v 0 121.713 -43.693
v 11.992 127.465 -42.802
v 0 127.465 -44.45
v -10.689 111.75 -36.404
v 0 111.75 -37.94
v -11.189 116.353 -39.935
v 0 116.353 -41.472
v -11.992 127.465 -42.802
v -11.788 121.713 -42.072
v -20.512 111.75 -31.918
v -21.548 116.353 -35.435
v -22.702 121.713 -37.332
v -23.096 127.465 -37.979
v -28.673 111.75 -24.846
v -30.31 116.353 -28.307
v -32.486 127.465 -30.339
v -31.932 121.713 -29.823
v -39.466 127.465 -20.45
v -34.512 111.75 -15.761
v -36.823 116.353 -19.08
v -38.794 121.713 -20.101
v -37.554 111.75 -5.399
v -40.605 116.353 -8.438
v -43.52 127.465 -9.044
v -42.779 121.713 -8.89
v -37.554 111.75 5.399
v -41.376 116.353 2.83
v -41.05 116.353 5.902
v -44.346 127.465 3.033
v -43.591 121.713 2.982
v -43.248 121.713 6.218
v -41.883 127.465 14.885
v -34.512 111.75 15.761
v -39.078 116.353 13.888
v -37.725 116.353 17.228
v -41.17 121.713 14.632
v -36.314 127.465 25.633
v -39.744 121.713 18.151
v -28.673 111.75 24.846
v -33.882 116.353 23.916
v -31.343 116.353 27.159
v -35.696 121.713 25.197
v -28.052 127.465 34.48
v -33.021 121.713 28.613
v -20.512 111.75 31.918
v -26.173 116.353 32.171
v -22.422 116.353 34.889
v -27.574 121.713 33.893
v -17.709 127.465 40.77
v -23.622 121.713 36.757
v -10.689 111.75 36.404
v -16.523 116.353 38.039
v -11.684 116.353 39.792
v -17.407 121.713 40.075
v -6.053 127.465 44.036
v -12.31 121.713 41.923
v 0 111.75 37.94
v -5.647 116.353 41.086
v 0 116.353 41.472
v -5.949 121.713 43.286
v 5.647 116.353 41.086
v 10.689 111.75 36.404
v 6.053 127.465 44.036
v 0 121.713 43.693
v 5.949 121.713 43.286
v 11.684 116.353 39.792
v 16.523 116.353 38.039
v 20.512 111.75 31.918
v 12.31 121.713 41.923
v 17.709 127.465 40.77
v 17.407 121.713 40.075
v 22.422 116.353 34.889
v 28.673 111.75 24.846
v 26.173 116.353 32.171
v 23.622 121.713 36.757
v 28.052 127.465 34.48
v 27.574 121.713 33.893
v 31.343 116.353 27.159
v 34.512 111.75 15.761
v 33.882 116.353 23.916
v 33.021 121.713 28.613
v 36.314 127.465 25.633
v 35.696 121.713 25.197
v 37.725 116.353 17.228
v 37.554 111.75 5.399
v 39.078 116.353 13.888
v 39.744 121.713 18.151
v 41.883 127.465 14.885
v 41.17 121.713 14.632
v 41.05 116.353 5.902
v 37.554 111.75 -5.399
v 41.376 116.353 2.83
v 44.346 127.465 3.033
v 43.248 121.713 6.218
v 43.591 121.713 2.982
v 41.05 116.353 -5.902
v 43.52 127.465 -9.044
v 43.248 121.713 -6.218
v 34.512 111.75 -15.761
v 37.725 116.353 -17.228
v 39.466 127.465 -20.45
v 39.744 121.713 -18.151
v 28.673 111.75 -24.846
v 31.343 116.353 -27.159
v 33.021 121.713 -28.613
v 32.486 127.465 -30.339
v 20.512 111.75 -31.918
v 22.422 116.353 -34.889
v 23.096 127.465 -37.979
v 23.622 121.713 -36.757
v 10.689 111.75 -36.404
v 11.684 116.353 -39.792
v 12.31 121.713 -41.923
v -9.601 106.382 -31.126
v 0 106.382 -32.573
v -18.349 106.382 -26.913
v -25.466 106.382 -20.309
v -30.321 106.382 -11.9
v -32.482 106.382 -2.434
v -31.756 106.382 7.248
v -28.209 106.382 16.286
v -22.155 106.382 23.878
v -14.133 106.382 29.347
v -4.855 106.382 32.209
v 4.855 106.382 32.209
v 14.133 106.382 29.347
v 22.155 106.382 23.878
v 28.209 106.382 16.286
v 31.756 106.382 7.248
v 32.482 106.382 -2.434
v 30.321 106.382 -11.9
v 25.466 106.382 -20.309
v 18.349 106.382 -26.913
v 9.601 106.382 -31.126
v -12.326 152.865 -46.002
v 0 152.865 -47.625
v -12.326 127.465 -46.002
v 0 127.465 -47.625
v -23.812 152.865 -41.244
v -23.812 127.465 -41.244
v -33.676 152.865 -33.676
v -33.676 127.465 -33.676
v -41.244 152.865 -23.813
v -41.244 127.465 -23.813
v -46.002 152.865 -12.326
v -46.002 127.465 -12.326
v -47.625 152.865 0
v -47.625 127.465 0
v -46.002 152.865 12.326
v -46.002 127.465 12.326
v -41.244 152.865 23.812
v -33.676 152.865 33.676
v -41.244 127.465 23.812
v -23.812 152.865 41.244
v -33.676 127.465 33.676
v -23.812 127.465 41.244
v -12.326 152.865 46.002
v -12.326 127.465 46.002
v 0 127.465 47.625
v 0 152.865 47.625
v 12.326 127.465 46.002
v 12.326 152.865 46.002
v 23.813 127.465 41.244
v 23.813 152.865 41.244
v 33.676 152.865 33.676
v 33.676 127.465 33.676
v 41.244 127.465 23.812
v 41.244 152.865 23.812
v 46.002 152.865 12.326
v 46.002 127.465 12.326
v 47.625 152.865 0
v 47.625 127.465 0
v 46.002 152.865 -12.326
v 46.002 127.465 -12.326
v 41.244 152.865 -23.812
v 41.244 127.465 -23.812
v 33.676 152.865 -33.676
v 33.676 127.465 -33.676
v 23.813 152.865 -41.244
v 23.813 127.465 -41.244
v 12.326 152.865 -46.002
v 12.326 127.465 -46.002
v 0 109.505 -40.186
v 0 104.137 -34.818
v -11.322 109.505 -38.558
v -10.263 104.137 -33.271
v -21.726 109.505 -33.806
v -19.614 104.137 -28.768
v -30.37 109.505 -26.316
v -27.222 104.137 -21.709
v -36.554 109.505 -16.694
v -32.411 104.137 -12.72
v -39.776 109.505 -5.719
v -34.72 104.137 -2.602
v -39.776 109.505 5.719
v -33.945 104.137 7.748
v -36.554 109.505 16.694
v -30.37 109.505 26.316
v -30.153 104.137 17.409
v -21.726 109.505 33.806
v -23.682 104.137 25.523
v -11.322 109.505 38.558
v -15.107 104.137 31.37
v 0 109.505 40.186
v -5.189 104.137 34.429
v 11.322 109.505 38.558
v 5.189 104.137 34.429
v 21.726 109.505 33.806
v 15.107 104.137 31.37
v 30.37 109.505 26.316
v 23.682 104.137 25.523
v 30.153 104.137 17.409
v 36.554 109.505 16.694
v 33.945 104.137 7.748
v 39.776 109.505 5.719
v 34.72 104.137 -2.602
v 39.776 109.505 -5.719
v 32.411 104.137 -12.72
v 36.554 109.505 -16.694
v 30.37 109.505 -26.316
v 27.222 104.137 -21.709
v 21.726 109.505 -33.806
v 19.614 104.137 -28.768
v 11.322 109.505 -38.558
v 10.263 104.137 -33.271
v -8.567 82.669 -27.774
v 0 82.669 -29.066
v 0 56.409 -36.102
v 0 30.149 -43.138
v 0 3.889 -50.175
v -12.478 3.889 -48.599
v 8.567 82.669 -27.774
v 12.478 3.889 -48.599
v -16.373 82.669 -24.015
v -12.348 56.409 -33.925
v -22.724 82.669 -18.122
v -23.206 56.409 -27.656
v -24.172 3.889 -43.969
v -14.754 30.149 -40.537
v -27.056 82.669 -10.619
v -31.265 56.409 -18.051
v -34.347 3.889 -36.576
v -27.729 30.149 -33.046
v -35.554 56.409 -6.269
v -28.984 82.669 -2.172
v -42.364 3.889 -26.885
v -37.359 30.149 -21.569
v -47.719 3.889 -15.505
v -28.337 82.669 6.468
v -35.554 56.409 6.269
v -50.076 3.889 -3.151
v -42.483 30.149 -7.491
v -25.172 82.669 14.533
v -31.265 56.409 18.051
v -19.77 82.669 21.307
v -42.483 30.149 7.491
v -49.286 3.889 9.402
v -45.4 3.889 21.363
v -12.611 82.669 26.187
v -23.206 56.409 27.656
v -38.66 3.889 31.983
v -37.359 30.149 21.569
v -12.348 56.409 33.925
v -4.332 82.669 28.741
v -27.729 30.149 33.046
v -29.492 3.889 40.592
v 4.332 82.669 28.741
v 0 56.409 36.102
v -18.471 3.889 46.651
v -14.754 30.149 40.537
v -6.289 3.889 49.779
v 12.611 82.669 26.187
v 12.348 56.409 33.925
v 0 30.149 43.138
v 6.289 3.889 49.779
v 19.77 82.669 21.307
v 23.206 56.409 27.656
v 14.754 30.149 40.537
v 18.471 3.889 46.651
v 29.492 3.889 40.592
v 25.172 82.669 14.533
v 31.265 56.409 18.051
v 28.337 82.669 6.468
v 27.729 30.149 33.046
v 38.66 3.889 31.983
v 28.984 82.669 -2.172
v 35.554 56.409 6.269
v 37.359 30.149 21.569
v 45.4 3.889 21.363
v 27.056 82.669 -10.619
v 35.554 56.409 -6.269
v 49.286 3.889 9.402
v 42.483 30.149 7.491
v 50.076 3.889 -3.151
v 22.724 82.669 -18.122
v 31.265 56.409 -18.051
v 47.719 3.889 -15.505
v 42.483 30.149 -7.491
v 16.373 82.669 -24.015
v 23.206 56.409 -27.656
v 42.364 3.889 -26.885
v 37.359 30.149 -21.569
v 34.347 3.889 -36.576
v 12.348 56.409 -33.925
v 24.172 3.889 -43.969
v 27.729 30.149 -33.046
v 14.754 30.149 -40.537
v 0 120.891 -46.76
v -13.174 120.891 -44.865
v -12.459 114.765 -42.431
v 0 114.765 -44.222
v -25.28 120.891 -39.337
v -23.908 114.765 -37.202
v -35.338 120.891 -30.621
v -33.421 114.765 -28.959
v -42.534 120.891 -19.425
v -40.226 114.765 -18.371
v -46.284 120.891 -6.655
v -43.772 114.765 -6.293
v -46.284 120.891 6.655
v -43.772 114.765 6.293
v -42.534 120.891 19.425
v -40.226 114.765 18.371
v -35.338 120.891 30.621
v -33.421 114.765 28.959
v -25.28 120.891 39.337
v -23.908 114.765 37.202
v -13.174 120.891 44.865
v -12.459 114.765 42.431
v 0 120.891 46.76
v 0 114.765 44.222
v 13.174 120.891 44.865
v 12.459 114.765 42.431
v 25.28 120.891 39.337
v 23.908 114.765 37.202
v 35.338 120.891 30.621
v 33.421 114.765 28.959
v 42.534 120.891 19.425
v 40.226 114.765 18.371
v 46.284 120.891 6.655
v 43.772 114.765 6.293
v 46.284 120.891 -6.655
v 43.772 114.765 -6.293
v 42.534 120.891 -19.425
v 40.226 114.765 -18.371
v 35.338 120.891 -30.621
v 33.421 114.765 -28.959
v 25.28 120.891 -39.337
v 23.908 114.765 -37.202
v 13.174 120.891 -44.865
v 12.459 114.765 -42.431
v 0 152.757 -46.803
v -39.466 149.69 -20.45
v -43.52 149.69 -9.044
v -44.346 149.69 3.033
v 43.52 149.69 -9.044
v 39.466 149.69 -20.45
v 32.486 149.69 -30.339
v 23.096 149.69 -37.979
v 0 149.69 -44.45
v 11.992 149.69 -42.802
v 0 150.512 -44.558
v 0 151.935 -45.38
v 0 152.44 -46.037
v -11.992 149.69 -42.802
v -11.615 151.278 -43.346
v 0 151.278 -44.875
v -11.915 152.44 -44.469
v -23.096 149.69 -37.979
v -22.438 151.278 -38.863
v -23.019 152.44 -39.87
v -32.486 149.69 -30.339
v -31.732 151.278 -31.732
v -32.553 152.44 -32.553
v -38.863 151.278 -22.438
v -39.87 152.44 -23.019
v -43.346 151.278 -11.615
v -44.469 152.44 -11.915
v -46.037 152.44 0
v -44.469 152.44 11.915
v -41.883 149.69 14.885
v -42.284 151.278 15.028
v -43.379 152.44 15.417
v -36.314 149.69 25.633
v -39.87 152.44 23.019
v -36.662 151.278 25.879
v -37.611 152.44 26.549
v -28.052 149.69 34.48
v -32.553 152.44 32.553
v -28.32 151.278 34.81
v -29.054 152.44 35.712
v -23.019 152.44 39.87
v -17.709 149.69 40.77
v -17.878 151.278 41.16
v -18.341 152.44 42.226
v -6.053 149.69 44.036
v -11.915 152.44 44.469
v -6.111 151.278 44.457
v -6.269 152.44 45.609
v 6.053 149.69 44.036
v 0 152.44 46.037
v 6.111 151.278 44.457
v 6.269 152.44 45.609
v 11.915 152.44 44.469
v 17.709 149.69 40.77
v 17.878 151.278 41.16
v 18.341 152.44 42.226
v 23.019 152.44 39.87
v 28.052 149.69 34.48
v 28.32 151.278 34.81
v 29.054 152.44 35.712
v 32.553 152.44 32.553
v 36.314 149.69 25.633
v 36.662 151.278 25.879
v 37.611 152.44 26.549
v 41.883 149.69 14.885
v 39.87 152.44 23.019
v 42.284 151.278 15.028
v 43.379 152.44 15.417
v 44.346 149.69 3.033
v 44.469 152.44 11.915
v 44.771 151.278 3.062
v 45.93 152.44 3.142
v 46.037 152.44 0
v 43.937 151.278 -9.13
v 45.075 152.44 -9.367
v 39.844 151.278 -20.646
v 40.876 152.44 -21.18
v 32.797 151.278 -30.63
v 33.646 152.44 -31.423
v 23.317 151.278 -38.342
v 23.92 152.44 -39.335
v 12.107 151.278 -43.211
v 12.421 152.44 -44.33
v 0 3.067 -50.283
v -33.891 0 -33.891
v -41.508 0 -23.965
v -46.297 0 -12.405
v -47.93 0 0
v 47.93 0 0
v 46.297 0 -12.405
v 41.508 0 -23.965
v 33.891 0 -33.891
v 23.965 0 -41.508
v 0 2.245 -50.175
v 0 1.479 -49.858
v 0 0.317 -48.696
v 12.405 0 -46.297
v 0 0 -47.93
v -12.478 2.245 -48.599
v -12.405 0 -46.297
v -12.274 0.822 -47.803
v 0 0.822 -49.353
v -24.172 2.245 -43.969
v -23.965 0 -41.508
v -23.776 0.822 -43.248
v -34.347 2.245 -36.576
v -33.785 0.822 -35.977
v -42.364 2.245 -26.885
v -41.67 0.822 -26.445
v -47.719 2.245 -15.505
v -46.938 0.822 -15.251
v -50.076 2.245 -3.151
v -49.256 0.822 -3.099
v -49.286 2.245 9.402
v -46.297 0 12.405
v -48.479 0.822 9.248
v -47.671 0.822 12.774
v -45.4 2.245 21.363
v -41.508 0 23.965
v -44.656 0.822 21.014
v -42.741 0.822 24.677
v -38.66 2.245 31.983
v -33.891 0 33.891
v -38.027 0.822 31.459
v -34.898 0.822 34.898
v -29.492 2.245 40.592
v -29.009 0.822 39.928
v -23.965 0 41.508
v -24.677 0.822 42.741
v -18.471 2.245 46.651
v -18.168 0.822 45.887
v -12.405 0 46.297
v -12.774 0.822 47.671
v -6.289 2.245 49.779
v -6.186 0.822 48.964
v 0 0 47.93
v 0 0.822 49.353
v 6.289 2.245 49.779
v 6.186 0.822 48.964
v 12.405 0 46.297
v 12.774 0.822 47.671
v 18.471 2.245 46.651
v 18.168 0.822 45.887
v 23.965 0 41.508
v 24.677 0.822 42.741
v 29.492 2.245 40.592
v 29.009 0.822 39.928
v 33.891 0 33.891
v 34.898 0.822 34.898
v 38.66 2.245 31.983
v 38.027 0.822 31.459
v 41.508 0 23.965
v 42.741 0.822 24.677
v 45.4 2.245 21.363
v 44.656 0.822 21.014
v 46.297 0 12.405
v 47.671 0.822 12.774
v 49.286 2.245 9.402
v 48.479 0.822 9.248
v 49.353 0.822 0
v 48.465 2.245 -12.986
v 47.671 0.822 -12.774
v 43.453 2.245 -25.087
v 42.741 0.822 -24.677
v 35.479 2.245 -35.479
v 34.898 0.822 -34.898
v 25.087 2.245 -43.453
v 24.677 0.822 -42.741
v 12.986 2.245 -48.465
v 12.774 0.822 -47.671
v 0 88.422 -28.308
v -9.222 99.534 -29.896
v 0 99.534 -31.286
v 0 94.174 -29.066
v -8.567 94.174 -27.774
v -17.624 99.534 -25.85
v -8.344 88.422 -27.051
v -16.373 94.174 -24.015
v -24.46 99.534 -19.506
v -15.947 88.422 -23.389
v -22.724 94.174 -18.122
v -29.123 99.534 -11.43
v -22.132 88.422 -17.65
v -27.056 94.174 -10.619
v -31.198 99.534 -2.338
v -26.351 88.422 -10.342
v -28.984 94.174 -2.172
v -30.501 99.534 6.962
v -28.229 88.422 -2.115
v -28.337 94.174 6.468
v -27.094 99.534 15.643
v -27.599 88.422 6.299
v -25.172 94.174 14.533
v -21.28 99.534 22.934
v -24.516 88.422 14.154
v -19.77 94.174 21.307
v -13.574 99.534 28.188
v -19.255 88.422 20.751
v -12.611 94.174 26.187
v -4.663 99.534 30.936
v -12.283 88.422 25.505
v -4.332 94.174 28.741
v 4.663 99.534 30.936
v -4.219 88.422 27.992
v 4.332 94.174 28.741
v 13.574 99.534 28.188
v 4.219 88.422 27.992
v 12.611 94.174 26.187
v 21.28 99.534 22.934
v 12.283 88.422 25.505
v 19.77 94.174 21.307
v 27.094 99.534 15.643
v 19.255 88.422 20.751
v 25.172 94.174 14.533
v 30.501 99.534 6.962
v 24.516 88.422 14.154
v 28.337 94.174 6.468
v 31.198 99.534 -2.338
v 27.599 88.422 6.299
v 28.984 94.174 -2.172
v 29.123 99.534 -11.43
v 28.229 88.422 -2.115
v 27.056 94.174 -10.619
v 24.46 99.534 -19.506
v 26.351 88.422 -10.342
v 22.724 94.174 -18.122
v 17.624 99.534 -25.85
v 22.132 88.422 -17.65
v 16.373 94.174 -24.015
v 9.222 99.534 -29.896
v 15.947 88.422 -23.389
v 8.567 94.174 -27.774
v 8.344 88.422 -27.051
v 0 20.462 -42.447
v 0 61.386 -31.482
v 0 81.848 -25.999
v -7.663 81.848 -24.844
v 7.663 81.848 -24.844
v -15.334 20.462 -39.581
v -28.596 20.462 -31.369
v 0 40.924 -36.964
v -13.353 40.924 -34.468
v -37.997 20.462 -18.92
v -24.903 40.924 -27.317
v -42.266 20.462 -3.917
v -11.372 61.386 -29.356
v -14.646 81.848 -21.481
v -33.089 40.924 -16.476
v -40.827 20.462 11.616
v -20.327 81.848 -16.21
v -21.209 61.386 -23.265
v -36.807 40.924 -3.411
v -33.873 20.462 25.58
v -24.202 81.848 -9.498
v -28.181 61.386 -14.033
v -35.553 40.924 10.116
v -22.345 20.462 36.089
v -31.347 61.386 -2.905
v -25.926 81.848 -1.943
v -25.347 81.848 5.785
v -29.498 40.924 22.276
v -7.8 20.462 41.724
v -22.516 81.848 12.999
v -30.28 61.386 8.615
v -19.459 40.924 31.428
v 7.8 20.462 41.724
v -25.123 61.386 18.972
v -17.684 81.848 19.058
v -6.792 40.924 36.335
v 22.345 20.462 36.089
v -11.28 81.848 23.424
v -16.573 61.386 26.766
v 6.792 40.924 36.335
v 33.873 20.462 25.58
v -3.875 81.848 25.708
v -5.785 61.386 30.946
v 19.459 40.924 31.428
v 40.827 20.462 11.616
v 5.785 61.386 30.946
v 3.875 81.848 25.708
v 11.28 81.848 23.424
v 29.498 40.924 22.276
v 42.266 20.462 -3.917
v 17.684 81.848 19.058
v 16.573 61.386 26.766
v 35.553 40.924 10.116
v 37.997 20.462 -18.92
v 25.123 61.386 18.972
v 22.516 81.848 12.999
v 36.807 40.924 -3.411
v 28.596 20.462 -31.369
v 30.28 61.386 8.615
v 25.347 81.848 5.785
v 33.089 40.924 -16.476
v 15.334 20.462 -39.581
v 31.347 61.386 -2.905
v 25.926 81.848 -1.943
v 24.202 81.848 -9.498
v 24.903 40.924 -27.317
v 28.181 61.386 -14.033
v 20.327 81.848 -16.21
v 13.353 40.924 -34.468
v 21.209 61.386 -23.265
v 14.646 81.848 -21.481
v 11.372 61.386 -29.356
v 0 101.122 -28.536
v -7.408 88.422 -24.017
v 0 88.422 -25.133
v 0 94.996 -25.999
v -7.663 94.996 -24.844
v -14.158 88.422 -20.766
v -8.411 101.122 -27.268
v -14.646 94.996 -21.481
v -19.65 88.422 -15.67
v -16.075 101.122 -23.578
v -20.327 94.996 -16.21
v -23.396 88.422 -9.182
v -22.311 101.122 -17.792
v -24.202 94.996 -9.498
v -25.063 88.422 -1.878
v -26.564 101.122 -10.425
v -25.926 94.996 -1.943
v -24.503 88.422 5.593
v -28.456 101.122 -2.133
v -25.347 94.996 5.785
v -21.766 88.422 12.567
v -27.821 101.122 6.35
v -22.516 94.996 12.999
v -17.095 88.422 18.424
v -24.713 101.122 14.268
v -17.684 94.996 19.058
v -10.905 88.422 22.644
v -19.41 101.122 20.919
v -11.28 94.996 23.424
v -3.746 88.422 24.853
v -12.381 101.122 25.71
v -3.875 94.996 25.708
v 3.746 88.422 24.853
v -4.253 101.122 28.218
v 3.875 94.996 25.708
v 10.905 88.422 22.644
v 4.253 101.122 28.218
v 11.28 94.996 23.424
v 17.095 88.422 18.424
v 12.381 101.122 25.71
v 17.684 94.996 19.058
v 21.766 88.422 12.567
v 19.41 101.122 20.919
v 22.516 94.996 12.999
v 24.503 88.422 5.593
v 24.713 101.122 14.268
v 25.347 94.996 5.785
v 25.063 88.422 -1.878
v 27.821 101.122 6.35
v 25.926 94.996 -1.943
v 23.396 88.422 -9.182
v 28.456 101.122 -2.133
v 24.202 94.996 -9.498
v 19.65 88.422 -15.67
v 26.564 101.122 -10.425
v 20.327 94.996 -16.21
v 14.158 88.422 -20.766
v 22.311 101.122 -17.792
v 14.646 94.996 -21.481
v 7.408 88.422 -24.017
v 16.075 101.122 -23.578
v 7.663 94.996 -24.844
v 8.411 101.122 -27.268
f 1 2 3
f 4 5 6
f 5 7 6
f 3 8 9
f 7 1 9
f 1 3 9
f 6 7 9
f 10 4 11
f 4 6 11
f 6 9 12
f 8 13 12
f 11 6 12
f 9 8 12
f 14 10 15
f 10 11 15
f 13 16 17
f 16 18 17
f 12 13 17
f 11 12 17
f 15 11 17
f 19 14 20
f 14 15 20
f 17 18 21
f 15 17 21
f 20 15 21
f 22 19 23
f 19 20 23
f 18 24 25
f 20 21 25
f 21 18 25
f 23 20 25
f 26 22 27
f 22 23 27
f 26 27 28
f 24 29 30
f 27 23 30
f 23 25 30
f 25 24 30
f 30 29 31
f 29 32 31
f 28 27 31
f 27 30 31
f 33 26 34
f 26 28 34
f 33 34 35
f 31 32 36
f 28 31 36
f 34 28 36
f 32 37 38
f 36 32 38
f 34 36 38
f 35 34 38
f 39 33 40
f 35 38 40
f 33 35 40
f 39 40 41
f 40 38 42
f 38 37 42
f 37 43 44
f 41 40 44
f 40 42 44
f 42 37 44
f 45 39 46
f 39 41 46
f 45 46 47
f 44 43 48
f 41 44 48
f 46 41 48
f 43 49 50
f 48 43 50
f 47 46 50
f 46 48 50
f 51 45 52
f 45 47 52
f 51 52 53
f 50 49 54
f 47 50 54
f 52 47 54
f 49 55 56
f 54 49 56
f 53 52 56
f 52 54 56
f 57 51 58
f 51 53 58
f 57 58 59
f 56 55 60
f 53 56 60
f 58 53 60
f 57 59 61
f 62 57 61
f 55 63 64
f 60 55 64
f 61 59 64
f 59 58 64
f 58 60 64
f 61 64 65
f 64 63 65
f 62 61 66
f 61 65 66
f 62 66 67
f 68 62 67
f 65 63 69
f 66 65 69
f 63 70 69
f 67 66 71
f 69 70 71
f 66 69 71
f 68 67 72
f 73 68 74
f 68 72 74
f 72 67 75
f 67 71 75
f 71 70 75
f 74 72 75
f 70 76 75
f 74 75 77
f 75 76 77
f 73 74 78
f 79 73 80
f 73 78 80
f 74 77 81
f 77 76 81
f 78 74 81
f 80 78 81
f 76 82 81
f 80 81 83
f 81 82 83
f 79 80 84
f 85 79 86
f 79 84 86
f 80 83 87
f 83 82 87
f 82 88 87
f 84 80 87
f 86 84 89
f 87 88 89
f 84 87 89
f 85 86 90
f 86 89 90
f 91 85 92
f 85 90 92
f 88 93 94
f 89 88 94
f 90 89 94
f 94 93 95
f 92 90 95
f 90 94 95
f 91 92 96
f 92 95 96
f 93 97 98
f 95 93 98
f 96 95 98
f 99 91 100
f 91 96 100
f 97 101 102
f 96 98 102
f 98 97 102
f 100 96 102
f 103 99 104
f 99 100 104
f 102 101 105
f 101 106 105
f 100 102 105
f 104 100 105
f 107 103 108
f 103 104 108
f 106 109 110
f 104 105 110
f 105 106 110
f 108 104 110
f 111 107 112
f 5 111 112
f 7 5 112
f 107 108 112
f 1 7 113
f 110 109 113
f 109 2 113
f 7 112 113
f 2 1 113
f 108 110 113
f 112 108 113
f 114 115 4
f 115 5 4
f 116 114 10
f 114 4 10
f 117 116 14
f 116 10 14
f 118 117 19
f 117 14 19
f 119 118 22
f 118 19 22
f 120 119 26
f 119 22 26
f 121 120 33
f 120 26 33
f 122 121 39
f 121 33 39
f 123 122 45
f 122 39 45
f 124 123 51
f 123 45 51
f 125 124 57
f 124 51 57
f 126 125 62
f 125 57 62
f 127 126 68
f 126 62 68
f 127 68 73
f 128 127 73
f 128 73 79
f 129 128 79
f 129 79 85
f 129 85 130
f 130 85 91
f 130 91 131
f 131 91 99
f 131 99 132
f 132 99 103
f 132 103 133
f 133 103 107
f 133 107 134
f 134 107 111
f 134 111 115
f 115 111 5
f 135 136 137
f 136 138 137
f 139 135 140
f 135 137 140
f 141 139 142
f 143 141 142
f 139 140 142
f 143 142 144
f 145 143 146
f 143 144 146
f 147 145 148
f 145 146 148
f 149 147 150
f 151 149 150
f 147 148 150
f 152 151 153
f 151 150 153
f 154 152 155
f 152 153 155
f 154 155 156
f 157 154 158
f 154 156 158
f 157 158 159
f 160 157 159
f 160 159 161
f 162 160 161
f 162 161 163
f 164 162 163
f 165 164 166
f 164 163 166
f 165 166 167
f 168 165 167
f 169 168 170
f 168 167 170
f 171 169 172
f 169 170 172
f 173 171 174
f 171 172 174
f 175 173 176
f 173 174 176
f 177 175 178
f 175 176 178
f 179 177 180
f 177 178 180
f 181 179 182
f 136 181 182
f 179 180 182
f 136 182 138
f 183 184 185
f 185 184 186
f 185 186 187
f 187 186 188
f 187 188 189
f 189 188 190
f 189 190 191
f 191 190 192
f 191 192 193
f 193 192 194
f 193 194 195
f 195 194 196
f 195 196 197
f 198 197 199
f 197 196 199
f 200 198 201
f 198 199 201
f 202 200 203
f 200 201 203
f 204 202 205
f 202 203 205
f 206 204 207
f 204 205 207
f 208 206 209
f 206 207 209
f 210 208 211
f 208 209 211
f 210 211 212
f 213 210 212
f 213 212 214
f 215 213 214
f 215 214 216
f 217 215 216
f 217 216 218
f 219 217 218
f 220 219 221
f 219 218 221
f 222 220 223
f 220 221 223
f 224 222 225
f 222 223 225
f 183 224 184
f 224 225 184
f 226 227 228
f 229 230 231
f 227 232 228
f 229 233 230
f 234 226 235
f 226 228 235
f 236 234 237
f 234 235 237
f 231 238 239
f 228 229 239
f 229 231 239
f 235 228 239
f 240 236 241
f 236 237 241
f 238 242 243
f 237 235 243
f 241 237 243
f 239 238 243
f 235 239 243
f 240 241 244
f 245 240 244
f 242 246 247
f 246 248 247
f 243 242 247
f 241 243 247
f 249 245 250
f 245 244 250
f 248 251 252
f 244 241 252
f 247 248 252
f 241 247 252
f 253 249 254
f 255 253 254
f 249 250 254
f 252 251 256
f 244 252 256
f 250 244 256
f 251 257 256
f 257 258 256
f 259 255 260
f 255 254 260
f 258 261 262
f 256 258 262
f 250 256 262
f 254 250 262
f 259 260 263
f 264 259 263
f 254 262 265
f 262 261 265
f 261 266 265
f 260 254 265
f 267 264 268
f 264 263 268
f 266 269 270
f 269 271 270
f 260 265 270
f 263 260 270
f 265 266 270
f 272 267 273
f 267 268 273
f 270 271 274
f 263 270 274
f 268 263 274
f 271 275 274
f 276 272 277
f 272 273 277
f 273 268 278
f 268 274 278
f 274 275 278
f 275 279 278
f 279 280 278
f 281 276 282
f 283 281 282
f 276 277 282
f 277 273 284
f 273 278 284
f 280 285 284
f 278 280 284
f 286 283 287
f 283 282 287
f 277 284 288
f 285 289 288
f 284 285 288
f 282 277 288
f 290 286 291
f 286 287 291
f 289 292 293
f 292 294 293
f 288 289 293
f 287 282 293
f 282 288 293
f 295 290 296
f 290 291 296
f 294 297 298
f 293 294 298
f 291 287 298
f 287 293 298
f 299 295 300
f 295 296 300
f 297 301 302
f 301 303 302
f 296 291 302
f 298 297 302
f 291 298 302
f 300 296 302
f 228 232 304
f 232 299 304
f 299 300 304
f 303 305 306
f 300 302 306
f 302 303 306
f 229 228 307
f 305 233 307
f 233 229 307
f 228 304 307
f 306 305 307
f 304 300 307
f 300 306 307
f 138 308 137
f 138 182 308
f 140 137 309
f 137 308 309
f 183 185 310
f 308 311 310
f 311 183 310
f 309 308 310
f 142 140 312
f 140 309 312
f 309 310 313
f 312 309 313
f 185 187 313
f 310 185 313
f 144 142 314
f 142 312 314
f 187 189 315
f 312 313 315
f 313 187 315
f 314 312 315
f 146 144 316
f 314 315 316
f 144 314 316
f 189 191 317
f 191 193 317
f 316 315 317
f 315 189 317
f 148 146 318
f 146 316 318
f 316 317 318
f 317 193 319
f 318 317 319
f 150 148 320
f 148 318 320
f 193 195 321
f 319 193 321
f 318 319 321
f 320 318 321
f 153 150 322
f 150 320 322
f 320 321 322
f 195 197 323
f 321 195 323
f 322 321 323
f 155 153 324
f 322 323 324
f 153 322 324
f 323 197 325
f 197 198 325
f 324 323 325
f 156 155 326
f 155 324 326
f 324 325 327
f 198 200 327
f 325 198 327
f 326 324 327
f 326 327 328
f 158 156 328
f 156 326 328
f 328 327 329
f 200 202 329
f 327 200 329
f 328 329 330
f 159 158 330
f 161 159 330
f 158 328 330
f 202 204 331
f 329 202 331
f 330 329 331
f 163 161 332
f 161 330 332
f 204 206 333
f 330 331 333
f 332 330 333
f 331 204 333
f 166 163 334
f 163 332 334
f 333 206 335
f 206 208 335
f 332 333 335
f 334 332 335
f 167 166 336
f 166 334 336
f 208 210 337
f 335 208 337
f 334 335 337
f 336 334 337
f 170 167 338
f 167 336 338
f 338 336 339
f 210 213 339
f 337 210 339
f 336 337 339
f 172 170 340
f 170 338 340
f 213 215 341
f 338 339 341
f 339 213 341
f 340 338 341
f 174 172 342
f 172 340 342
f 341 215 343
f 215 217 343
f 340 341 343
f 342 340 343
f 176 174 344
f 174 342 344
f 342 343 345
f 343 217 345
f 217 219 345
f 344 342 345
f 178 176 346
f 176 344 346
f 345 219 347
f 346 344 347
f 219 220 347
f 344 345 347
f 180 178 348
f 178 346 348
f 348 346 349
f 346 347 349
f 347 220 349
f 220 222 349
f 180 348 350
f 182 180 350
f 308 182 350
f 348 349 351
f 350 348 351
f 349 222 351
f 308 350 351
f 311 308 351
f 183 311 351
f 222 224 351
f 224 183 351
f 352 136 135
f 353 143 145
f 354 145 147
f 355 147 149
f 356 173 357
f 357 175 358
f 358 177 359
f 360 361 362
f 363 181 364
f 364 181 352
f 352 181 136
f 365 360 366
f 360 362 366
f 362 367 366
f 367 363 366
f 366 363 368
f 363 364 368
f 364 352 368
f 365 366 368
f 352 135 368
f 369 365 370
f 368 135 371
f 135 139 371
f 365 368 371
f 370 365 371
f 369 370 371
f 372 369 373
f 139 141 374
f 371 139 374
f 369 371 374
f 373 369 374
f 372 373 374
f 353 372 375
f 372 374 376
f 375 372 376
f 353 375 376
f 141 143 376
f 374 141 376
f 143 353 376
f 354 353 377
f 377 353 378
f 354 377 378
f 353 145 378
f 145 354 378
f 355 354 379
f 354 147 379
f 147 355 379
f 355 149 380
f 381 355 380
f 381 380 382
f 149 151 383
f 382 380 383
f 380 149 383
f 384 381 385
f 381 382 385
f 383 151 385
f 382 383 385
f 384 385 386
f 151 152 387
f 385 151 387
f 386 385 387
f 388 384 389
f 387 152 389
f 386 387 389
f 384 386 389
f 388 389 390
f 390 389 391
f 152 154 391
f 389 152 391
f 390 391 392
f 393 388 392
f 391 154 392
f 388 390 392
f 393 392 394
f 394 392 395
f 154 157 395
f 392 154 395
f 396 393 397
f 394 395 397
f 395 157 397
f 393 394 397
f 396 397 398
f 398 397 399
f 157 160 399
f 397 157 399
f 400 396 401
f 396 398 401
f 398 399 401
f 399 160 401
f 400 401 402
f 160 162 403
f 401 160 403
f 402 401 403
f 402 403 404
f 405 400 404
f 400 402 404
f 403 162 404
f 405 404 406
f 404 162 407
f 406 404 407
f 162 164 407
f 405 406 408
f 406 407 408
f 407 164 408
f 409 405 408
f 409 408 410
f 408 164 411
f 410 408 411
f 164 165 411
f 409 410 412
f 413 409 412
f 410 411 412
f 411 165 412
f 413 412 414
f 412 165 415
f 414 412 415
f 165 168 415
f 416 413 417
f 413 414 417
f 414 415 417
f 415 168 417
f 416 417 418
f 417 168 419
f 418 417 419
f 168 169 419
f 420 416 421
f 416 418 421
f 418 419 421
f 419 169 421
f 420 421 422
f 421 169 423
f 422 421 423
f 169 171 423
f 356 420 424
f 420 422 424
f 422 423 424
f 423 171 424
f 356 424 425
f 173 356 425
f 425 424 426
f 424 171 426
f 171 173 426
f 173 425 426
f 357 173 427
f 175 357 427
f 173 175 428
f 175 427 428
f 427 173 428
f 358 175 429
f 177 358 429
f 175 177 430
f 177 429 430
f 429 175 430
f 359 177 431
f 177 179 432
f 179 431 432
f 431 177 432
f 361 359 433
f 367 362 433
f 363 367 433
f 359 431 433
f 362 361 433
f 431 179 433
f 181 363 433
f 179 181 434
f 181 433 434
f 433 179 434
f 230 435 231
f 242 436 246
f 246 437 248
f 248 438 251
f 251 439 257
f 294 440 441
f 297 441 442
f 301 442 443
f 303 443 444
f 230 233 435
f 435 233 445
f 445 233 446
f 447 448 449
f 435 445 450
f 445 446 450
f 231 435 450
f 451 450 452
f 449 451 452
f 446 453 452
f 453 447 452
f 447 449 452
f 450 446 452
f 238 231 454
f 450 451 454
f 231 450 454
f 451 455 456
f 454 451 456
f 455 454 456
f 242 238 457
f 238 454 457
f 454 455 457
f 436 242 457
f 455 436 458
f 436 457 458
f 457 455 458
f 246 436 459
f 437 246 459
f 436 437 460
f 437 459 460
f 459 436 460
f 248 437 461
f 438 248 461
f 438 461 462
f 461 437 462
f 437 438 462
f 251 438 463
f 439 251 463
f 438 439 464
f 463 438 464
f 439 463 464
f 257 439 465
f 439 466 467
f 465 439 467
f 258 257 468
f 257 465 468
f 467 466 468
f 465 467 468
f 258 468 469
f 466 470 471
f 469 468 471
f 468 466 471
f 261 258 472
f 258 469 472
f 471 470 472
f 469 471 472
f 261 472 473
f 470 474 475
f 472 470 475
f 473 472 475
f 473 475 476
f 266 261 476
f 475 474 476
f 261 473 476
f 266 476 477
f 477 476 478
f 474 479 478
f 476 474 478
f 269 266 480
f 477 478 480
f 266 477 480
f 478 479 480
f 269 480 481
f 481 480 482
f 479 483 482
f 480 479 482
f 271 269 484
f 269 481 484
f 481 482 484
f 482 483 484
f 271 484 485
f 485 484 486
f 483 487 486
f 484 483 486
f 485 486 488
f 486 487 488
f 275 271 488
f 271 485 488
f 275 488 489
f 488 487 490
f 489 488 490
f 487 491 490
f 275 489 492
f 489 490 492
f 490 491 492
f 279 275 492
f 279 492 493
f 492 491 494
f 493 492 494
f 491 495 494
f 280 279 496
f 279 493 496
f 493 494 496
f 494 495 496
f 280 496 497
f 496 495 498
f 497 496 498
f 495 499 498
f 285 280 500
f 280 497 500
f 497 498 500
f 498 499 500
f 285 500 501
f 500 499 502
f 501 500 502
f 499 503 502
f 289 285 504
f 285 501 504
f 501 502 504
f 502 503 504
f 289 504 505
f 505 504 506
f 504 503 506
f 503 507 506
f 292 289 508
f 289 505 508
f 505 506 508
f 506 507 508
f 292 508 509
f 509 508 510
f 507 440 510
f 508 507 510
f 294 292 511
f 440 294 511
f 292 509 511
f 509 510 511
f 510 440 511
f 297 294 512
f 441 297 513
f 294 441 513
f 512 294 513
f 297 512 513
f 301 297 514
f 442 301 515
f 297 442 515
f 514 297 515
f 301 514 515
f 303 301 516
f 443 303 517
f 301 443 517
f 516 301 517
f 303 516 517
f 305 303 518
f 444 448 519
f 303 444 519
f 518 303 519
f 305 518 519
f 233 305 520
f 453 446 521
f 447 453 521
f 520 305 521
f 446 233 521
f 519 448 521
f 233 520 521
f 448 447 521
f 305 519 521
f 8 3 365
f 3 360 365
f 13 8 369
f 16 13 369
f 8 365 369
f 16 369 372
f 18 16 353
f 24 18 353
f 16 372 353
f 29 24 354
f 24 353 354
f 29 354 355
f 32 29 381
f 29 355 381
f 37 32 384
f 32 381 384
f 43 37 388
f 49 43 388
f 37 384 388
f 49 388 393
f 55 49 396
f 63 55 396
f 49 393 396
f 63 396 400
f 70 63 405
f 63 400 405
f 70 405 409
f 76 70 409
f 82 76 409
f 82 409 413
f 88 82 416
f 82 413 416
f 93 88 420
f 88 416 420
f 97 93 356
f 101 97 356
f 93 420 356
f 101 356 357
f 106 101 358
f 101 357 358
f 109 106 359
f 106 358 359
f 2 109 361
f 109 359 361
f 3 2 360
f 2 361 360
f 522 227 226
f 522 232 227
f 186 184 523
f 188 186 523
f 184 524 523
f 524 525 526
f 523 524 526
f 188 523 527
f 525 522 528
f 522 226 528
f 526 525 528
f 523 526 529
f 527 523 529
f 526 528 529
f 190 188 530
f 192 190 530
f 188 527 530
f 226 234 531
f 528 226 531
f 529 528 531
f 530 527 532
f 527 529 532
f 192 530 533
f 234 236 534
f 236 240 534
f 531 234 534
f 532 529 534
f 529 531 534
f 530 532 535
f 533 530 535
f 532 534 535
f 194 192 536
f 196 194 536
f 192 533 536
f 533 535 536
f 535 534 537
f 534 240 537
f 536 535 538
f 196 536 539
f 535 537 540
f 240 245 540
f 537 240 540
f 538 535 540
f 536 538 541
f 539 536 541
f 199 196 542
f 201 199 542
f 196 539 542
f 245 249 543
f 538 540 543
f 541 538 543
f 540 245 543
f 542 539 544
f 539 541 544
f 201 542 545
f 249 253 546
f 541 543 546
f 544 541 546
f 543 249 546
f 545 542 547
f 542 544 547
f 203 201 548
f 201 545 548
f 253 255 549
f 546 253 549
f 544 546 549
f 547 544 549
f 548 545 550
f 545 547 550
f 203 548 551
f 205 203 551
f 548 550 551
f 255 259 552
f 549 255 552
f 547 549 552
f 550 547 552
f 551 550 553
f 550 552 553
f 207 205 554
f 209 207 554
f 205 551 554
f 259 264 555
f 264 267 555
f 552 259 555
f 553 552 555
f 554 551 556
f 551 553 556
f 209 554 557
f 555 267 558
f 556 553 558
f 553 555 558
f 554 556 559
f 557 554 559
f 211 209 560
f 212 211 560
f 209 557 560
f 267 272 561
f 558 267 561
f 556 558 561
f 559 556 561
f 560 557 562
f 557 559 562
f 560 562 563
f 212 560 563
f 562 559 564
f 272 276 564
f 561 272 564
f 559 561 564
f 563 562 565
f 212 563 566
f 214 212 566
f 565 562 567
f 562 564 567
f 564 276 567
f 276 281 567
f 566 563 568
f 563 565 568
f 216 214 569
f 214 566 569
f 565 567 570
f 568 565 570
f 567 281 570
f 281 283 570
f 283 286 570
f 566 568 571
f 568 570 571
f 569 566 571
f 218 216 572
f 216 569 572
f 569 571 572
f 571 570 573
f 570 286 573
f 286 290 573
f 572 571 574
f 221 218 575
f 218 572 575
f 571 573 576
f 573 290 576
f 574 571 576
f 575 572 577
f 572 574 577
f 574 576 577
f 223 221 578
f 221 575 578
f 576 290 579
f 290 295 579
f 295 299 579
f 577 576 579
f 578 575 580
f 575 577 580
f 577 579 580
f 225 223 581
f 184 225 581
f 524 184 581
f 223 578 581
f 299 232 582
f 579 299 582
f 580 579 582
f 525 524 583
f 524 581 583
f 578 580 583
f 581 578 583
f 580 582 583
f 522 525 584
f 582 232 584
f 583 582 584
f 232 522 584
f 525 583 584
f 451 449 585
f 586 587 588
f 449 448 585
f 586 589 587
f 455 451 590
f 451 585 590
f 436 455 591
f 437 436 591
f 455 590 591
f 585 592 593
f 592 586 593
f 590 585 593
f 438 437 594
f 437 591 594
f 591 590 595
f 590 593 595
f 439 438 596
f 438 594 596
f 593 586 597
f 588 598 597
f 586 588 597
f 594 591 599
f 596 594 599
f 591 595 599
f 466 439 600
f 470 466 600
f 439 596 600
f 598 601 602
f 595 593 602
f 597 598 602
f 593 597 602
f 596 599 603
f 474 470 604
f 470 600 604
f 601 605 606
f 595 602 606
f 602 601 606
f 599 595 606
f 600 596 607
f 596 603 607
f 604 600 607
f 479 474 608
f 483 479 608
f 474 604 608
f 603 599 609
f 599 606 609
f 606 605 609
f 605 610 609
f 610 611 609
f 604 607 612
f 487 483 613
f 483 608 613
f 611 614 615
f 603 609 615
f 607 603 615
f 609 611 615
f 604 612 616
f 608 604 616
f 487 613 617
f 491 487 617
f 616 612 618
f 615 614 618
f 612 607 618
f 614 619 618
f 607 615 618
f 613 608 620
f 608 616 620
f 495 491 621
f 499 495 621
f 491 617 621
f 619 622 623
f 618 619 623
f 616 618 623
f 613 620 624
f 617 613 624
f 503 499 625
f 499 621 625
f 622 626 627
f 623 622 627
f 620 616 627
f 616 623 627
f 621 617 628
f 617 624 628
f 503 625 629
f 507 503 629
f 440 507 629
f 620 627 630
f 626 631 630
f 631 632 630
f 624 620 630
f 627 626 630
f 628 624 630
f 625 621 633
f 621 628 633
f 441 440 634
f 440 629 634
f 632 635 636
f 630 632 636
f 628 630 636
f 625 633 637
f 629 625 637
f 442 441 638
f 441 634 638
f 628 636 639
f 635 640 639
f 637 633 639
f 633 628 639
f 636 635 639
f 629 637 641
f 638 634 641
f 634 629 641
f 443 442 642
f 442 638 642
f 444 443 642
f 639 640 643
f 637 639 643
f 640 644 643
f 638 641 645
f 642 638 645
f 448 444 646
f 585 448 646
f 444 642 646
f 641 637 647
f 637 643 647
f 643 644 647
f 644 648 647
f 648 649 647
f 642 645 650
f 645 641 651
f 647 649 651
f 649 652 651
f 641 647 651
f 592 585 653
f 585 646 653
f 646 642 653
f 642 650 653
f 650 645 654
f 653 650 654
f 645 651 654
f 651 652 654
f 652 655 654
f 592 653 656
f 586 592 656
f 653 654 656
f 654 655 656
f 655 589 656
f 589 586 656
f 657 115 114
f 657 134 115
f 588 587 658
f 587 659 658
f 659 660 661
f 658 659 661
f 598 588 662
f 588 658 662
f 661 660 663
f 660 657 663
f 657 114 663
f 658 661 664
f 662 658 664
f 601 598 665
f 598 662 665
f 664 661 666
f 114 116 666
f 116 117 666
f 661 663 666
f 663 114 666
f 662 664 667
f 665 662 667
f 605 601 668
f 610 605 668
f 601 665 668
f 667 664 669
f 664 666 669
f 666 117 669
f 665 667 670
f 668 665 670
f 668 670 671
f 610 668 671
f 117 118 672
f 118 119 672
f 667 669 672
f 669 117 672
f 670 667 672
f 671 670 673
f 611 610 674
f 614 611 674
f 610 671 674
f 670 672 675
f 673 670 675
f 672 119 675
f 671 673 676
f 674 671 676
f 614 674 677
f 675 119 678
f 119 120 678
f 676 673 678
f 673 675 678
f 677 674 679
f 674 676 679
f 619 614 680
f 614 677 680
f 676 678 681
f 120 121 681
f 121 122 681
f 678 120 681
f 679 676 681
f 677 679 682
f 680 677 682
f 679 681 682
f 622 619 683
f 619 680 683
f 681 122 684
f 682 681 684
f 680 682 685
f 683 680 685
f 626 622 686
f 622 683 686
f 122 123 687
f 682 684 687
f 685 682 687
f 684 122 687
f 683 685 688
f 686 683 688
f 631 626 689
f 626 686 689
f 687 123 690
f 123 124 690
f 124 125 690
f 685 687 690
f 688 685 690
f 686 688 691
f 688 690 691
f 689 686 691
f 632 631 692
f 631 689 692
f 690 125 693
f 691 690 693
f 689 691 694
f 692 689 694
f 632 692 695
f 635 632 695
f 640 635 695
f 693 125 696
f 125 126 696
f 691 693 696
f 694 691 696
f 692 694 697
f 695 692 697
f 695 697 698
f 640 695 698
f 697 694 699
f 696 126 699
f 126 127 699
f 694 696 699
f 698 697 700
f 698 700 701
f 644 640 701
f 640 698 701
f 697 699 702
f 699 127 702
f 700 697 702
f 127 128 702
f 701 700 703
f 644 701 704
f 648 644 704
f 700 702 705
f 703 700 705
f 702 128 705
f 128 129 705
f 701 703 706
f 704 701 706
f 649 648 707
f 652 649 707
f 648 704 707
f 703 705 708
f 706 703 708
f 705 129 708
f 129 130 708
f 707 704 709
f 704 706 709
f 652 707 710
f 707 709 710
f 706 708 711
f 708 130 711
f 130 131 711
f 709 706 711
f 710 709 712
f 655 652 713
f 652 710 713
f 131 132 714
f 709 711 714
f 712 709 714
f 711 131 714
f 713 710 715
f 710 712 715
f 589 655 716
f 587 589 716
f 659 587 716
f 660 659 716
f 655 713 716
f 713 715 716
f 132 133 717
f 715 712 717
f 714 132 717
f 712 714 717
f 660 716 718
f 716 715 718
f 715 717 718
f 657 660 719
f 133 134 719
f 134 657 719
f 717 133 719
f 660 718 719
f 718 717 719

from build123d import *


with BuildPart() as part:
    # Sketch1 → Revolve1 (revolve)
    with BuildSketch(Plane.XY, mode=Mode.PRIVATE) as revolve1_sk:
        with BuildLine():
            Line((47.9298, 0), (25.998784012, 81.847665928))
            ThreePointArc((25.998784012, 81.847665928), (25.998784012, 94.995673419), (32.572787758, 106.382181916))
            Line((32.572787758, 106.382181916), (37.940448212, 111.74984237))
            ThreePointArc((37.940448212, 111.74984237), (42.75822261, 118.960151297), (44.45, 127.465290581))
            Line((44.45, 127.465290581), (44.45, 149.690290581))
            ThreePointArc((44.45, 149.690290581), (45.37993597, 151.935354612), (47.625, 152.865290581))
            Line((47.625, 152.865290581), (47.625, 127.465290581))
            ThreePointArc((47.625, 127.465290581), (45.691540126, 117.745131399), (40.185512242, 109.504778339))
            Line((40.185512242, 109.504778339), (34.817851788, 104.137117885))
            ThreePointArc((34.817851788, 104.137117885), (29.065598511, 94.173922951), (29.065598511, 82.669416396))
            Line((29.065598511, 82.669416396), (50.17486403, 3.888564967))
            ThreePointArc((50.17486403, 3.888564967), (49.857680189, 1.479314498), (47.9298, 0))
        make_face()
    revolve(revolve1_sk.sketch.rotate(Axis((0, 0, 0), (0, 1, 0)), 90), axis=Axis((0, 0, 0), (0, 1, 0)))


solid = part.part
